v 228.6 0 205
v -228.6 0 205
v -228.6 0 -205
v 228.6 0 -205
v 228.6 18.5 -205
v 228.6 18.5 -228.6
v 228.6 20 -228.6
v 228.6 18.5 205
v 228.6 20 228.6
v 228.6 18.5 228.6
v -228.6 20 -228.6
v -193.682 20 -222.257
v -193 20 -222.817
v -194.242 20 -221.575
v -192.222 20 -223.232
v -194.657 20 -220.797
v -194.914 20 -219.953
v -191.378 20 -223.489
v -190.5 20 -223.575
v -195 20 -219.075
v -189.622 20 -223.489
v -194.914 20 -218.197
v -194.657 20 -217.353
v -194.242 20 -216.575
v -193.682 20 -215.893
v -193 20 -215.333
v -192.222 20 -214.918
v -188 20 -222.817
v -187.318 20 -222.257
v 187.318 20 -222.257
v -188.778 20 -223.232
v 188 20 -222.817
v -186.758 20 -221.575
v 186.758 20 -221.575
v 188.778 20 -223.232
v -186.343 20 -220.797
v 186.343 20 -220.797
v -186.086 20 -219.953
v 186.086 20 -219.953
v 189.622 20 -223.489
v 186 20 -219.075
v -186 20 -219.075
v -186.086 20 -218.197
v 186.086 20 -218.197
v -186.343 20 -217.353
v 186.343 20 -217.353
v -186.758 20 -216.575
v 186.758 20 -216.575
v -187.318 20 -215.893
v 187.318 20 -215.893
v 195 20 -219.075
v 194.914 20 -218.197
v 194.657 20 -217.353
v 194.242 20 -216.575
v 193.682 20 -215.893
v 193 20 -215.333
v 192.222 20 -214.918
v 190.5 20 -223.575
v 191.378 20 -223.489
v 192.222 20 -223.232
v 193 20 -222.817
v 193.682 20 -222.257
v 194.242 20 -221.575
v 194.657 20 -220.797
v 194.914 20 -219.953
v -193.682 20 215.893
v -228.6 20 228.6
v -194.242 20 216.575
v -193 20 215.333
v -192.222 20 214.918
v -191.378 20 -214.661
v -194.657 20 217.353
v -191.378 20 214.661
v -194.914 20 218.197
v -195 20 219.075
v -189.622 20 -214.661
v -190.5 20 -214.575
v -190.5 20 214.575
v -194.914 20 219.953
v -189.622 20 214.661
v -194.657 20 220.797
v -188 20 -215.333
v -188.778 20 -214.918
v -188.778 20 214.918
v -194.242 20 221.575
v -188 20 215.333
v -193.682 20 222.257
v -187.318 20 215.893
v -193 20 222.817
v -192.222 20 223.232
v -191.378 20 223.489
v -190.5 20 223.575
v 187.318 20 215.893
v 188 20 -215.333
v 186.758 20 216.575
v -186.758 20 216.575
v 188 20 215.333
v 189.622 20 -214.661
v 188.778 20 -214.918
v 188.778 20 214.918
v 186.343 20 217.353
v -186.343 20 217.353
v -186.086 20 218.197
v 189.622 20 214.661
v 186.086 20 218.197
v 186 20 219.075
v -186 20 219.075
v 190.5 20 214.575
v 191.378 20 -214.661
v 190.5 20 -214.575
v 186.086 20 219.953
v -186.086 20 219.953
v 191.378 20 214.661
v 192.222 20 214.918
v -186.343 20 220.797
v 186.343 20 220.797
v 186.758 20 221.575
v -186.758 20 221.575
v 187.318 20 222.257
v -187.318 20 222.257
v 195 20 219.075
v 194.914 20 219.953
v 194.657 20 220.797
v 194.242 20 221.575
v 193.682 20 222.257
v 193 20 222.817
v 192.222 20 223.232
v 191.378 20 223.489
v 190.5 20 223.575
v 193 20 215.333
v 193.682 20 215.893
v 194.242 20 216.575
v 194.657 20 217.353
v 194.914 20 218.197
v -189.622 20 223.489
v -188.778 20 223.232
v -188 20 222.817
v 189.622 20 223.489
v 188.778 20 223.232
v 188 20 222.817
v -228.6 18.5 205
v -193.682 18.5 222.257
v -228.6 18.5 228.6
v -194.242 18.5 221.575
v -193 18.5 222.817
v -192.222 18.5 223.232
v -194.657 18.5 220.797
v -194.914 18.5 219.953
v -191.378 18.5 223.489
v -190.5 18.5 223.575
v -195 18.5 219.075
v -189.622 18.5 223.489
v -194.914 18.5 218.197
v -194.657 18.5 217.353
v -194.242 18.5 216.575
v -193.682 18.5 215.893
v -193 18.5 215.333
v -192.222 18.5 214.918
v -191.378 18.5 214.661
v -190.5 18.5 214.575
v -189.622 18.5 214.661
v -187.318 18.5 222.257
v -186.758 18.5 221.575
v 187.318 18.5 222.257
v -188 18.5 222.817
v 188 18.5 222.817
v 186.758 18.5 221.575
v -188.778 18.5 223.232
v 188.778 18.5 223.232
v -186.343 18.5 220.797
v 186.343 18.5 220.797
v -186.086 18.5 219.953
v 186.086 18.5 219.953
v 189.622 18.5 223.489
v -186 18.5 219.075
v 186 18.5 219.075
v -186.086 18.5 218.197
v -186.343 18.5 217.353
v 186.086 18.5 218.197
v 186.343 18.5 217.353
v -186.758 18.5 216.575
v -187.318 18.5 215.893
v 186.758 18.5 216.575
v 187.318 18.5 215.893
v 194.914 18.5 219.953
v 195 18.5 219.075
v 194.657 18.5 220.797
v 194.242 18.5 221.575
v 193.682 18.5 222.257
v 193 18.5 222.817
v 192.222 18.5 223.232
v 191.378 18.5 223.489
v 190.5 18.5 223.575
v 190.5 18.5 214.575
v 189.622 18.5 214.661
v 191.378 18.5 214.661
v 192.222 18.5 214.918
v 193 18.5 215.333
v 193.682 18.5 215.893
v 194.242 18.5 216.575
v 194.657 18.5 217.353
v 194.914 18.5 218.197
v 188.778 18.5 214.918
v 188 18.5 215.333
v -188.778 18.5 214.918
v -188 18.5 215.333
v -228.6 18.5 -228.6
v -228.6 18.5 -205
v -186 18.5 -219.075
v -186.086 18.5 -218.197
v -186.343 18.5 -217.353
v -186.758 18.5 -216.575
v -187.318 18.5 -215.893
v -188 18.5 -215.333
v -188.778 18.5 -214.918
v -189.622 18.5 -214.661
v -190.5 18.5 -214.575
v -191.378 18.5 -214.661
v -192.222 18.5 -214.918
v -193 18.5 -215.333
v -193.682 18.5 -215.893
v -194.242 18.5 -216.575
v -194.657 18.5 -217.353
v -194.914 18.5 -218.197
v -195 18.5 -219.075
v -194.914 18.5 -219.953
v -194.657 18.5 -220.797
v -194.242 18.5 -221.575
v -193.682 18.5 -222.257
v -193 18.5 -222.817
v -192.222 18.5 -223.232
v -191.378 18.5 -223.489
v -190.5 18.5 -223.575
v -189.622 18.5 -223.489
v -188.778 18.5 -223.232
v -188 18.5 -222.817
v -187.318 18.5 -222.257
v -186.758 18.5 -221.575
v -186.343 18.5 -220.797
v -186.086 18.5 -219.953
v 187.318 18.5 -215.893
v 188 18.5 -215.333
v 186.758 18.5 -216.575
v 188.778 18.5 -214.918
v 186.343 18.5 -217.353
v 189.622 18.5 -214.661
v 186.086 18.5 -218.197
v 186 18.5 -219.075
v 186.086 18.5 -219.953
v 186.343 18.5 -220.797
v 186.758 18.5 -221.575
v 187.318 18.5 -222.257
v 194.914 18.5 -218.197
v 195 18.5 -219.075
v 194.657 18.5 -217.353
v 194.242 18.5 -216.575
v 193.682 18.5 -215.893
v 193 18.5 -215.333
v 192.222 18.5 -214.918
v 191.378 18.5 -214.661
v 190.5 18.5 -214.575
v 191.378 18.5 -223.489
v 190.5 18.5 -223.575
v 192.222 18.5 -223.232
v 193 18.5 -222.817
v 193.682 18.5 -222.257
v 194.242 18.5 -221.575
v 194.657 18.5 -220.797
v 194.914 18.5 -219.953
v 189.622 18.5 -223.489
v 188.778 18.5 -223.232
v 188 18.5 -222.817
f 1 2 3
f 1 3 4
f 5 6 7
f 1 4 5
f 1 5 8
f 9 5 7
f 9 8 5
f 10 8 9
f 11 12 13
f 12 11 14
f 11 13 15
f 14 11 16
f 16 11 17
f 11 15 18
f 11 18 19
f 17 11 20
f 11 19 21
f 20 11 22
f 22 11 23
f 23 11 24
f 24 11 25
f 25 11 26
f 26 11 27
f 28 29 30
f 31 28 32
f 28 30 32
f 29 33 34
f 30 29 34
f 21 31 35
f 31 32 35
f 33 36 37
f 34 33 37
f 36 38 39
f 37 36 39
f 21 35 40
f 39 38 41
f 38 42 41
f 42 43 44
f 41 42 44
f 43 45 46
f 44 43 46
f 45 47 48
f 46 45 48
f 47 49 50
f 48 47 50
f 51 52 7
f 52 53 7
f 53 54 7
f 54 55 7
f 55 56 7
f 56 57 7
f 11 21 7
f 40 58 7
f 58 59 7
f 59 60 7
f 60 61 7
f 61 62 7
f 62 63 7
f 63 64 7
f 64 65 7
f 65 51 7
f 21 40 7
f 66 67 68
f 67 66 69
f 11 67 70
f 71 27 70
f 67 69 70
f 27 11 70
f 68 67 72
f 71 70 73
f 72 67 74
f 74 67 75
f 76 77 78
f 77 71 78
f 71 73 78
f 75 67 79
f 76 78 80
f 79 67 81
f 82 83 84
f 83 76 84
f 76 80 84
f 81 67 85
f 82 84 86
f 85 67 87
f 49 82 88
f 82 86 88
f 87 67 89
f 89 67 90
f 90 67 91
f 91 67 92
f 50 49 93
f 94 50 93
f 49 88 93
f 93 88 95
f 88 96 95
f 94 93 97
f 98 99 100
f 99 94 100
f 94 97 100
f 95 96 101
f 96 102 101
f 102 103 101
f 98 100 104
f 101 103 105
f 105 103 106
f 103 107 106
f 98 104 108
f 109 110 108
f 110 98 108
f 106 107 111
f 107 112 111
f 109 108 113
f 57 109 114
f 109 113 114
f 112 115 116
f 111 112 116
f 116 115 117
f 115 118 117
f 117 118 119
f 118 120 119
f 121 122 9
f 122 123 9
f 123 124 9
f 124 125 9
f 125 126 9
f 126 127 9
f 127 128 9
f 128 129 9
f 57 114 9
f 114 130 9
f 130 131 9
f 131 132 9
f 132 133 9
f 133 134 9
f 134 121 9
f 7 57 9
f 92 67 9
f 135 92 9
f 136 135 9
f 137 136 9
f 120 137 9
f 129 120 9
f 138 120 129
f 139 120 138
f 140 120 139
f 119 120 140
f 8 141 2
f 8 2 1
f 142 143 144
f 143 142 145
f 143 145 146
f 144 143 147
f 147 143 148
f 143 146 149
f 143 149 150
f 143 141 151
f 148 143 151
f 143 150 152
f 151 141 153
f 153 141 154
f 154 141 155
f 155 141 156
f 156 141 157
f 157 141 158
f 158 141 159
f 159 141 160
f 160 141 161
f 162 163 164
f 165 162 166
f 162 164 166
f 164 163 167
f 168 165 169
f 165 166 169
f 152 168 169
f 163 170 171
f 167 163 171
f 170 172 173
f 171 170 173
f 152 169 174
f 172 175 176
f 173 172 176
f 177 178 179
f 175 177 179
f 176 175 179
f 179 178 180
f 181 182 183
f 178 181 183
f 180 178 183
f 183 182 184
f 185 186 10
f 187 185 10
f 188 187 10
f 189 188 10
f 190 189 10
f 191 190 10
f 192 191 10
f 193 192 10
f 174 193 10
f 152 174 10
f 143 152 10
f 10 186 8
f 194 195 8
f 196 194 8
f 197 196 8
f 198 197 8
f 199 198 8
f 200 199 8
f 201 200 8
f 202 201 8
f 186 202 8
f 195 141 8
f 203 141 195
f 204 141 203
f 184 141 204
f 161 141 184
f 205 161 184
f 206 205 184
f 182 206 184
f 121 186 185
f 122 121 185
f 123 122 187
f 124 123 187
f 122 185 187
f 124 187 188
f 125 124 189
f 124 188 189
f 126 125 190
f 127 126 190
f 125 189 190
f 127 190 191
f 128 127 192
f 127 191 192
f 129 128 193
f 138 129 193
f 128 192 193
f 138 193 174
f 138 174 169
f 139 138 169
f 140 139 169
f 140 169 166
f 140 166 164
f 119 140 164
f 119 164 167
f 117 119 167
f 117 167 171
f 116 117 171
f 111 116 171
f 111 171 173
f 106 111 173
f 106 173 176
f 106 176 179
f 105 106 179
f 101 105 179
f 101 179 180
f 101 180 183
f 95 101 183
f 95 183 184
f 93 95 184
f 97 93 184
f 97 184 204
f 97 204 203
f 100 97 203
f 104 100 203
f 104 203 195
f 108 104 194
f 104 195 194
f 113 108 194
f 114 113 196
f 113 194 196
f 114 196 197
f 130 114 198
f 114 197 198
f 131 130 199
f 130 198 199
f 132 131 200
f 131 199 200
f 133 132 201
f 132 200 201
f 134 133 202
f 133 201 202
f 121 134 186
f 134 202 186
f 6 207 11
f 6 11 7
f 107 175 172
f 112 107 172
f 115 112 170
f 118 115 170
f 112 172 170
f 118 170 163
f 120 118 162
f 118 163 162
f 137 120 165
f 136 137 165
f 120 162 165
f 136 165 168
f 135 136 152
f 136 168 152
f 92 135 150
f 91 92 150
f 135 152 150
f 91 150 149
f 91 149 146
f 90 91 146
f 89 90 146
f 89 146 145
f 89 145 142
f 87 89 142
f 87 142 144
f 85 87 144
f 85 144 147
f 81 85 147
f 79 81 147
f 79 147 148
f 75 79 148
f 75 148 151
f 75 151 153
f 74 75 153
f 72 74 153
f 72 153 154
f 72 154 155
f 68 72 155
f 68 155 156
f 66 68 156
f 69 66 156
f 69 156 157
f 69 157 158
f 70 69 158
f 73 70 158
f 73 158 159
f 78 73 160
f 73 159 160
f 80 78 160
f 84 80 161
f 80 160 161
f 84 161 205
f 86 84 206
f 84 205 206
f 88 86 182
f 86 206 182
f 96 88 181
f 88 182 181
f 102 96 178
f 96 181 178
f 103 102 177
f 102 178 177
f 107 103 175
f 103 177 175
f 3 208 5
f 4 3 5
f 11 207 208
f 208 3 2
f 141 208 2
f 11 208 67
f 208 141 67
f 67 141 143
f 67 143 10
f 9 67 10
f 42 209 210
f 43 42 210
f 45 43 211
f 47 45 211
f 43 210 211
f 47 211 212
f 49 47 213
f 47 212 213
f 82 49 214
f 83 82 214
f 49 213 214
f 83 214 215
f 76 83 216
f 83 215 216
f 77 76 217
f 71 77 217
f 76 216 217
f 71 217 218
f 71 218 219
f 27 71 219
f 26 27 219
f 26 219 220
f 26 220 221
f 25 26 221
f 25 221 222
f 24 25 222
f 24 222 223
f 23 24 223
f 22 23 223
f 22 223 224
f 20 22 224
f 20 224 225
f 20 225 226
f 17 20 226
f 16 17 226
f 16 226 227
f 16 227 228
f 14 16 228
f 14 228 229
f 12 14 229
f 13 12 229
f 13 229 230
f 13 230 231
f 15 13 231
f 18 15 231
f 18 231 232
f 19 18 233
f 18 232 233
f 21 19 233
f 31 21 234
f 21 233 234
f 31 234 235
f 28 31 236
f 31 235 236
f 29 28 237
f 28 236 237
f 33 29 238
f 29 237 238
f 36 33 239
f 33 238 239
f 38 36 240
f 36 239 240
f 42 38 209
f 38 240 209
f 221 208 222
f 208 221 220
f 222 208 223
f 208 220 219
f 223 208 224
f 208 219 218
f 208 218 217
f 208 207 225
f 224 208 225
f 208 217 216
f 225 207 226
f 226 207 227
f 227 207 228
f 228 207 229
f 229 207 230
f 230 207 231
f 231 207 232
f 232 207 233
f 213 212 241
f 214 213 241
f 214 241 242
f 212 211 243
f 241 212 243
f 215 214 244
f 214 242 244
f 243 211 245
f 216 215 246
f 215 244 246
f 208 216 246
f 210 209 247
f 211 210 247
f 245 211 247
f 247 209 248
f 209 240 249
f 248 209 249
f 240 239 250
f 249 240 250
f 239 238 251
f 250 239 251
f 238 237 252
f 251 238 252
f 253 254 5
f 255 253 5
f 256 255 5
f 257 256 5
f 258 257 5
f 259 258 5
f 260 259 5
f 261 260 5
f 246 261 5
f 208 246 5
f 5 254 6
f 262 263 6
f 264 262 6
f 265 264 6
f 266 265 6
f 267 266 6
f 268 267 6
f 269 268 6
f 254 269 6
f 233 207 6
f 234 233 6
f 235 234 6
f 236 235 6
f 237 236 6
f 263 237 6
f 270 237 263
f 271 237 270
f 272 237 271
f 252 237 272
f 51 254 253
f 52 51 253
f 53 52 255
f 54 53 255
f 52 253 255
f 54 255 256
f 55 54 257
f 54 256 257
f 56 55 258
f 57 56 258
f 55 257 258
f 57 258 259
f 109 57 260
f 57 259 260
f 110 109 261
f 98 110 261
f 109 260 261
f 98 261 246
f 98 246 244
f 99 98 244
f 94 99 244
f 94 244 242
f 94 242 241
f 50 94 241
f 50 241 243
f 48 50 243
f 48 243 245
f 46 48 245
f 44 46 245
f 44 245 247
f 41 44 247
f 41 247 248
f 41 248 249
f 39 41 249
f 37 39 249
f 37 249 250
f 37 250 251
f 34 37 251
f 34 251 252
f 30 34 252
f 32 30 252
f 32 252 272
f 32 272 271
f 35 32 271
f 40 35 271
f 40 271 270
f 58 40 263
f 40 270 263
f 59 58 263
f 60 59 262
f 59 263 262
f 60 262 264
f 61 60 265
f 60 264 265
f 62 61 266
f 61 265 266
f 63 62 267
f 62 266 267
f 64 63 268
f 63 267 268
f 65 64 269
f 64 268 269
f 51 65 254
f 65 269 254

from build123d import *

# Parameters (mm, degrees)
BOX001_W      = 460
BOX001_H      = 18.5
BOX001_DEPTH  = 24
BOX_W         = 460
BOX_H         = 18.5
BOX_DEPTH     = 24
SKETCH_W      = 457.2
SKETCH_H      = 457.2
SKETCH_R      = 4.5
EXTRUDE_DEPTH = 20


with BuildPart() as cube001:
    # Box001 → Box001 (new body)
    with BuildSketch(Plane(origin=(-229, 0, 205), x_dir=(1, 0, 0), z_dir=(0, 0, 1))):
        with Locations((230, 9.25)):
            Rectangle(BOX001_W, BOX001_H)
    extrude(amount=BOX001_DEPTH)


with BuildPart() as cut:
    # Box → Box (new body)
    with BuildSketch(Plane(origin=(-229, 0, -229), x_dir=(1, 0, 0), z_dir=(0, 0, 1))):
        with Locations((230, 9.25)):
            Rectangle(BOX_W, BOX_H)
    extrude(amount=BOX_DEPTH)

    # Fusion: union Cube001
    add(cube001.part)


with BuildPart() as cut_body:
    # Sketch → Extrude (new body)
    with BuildSketch(Plane.XZ):
        Rectangle(SKETCH_W, SKETCH_H)
        with Locations((-190.5, -219.075)):
            Circle(SKETCH_R, mode=Mode.SUBTRACT)
        with Locations((-190.5, 219.075)):
            Circle(SKETCH_R, mode=Mode.SUBTRACT)
        with Locations((190.5, 219.075)):
            Circle(SKETCH_R, mode=Mode.SUBTRACT)
        with Locations((190.5, -219.075)):
            Circle(SKETCH_R, mode=Mode.SUBTRACT)
    extrude(amount=-EXTRUDE_DEPTH)

    # Cut: cut cut
    add(cut.part, mode=Mode.SUBTRACT)


solid = cut_body.part
